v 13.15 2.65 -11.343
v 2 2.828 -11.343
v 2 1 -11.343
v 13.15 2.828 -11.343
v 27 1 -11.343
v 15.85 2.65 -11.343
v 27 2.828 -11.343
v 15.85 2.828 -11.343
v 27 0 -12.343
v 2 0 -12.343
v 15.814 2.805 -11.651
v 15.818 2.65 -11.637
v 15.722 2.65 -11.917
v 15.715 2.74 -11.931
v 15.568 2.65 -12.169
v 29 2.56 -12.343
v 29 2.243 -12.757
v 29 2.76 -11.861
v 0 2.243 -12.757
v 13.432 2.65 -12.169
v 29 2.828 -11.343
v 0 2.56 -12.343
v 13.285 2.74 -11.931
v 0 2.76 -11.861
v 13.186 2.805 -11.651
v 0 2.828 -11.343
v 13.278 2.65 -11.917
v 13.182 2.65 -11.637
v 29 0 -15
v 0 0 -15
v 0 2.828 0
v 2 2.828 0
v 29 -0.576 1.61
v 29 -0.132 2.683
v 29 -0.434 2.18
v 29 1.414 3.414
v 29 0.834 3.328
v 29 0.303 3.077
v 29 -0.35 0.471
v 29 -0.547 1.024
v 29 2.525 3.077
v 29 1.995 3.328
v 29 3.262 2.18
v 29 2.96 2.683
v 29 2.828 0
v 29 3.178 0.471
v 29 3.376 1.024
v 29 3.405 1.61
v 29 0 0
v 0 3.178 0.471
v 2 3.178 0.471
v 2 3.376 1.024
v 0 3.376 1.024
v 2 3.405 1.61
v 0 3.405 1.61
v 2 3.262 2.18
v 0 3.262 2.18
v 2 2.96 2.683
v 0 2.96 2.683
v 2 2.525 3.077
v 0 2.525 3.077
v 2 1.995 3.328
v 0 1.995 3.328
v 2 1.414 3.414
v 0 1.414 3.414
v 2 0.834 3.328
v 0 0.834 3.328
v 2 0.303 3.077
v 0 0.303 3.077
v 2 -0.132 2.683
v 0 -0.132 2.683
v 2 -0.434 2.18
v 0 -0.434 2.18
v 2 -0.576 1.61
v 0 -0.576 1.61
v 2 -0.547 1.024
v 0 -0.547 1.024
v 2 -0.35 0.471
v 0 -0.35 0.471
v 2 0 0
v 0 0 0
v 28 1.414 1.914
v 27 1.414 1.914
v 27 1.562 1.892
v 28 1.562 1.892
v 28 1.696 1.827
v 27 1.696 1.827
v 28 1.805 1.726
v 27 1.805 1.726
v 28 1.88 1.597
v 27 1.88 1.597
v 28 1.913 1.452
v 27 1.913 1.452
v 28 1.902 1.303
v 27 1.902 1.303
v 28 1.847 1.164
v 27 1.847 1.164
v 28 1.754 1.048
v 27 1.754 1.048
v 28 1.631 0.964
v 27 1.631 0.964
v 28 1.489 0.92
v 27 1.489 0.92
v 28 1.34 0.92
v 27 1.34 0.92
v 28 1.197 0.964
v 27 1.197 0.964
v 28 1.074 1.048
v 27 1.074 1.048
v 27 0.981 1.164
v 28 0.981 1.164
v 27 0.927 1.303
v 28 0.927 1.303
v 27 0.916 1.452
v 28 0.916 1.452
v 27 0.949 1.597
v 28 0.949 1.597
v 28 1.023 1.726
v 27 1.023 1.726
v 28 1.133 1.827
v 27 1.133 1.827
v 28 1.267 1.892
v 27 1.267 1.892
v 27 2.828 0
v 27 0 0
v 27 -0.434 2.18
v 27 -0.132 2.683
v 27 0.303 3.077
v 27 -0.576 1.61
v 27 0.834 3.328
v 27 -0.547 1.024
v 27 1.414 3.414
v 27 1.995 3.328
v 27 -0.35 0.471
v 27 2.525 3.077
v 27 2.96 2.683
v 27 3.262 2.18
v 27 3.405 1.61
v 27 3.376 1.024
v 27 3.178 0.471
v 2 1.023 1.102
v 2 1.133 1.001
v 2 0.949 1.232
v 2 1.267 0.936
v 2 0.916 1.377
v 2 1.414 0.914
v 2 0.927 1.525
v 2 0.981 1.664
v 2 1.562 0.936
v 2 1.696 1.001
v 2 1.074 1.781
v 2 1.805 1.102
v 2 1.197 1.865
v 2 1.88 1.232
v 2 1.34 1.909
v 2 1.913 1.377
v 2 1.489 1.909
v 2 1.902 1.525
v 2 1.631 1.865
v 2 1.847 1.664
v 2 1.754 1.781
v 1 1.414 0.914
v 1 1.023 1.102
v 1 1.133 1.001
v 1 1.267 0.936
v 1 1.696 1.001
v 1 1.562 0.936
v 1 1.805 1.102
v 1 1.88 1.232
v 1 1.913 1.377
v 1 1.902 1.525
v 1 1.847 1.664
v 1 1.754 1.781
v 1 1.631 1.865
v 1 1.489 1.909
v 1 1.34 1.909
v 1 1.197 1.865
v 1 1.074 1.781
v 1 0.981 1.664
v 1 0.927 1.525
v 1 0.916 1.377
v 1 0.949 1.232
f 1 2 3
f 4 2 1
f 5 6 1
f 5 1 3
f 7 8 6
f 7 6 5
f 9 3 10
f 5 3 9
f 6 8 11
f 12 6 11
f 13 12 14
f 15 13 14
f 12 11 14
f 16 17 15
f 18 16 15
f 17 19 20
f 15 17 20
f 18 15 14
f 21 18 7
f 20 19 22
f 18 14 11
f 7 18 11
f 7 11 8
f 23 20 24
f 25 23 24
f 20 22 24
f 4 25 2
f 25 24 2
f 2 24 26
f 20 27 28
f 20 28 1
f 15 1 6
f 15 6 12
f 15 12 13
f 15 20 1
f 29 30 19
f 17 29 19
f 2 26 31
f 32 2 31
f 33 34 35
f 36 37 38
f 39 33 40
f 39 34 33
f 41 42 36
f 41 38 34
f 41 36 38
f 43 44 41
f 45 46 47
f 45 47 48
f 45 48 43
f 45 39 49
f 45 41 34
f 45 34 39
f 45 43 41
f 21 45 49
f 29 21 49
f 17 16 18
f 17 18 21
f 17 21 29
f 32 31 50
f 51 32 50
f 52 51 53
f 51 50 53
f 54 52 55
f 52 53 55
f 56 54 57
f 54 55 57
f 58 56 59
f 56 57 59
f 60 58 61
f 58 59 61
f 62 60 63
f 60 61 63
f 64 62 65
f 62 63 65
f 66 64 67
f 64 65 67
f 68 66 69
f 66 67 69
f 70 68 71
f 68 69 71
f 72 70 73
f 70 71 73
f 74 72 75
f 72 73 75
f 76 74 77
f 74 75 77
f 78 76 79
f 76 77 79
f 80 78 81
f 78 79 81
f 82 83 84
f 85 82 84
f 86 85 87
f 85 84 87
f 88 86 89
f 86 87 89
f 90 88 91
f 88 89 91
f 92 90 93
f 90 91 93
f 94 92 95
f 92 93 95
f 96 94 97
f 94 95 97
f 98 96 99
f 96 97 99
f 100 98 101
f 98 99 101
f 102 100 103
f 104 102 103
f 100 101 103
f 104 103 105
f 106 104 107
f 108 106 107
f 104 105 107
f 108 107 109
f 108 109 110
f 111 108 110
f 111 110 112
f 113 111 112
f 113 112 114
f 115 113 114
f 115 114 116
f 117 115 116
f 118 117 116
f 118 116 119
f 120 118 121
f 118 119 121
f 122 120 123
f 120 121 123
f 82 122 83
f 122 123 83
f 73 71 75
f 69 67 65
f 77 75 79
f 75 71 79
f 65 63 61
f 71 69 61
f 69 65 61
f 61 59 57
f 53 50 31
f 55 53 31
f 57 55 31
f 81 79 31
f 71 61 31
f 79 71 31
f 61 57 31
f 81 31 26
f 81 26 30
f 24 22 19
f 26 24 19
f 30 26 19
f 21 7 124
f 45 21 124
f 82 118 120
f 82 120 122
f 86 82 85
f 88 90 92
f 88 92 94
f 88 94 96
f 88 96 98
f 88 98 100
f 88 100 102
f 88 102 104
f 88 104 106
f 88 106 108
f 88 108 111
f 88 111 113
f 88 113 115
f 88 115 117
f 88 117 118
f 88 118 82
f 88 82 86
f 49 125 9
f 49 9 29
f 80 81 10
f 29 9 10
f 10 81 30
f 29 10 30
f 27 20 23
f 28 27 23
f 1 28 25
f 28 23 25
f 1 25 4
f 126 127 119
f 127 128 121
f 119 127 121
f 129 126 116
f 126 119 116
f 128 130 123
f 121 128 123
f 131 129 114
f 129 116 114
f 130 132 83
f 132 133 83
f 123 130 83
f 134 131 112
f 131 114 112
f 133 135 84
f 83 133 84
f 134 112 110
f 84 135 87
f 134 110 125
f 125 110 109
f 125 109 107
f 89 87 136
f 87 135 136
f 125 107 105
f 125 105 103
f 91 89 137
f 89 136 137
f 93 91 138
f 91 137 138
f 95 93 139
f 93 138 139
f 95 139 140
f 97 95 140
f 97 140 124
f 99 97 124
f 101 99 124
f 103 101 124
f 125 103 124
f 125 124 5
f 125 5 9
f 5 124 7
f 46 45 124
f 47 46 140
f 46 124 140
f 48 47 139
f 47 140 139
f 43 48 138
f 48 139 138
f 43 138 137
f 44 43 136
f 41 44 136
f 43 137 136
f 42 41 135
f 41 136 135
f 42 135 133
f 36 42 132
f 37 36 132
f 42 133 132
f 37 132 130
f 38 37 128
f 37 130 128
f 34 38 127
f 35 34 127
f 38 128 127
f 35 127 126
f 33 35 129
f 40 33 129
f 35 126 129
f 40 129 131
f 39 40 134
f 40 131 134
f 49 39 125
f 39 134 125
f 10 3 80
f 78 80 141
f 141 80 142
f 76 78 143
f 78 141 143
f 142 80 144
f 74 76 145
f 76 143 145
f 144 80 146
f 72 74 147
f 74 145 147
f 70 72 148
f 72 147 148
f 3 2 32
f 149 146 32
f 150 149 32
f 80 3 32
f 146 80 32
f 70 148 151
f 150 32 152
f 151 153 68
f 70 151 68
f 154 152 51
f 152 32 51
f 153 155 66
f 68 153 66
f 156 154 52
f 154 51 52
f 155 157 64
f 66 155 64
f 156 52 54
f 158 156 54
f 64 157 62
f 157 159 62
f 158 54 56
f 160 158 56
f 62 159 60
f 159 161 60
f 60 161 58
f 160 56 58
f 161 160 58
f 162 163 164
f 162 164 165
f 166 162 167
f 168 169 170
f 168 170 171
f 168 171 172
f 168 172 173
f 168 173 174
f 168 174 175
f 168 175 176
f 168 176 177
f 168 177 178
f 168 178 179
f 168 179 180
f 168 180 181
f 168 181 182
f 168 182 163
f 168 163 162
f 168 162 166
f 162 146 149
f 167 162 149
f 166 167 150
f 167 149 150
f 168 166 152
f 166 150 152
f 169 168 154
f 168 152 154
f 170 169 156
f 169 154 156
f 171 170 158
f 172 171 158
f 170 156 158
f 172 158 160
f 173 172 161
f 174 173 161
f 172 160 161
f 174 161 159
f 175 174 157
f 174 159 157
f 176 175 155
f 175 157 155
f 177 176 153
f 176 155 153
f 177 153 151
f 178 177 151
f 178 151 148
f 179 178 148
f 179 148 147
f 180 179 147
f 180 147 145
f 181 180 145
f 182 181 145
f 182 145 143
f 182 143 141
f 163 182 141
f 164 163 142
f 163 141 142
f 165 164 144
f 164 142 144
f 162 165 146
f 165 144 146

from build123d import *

# Parameters (mm, degrees)
SALIENTE_EXTRUIR1_DEPTH = 29
CORTAR_EXTRUIR1_DEPTH   = 14.5
CHAFL_N1_SIZE           = 1
CROQUIS3_R              = 0.5
CORTAR_EXTRUIR2_DEPTH   = 1
CROQUIS4_R              = 0.5
CORTAR_EXTRUIR3_DEPTH   = 1
CORTAR_EXTRUIR5_DEPTH   = 0.2


with BuildPart() as part:
    # Croquis1 → Saliente-Extruir1 (new body)
    with BuildSketch(Plane(origin=(0, 0, 0), x_dir=(0, 0, -1), z_dir=(1, 0, 0))):
        with BuildLine():
            Line((0, 0), (15, 0))
            Line((15, 0), (12.757359313, 2.242640687))
            ThreePointArc((12.757359313, 2.242640687), (12.108512615, 2.67618619), (11.343145751, 2.828427125))
            Line((11.343145751, 2.828427125), (0, 2.828427125))
            ThreePointArc((0, 2.828427125), (-3.414213562, 1.414213562), (0, 0))
        make_face()
    extrude(amount=SALIENTE_EXTRUIR1_DEPTH)

    # Croquis2 → Cortar-Extruir1 (cut, symmetric)
    with BuildSketch(Plane(origin=(0, 2.828427125, 0), x_dir=(1, 0, 0), z_dir=(0, 1, 0))):
        Polygon((2, 0), (2, 11.343145751), (27, 11.343145751), (27, 0), (27, -11.34659481), (2, -9.45811087), align=None)
    extrude(amount=CORTAR_EXTRUIR1_DEPTH, both=True, mode=Mode.SUBTRACT)

    # Chaflán1
    chafl_n1_edges = [part.edges().sort_by_distance(p)[0] for p in [
        (14.5, 0, -11.343145751),
    ]]
    chamfer(chafl_n1_edges, length=CHAFL_N1_SIZE)

    # Croquis3 → Cortar-Extruir2 (cut)
    with BuildSketch(Plane.ZY.offset(-27)):
        with Locations((1.414213562, 1.414213562)):
            Circle(CROQUIS3_R)
    extrude(amount=-CORTAR_EXTRUIR2_DEPTH, mode=Mode.SUBTRACT)

    # Croquis4 → Cortar-Extruir3 (cut)
    with BuildSketch(Plane(origin=(2, 0, 0), x_dir=(0, 0, -1), z_dir=(1, 0, 0))):
        with Locations((-1.414213562, 1.414213562)):
            Circle(CROQUIS4_R)
    extrude(amount=-CORTAR_EXTRUIR3_DEPTH, mode=Mode.SUBTRACT)

    # Croquis5 → Cortar-Extruir5 (cut)
    with BuildSketch(Plane(origin=(0, 2.85, 0), x_dir=(1, 0, 0), z_dir=(0, 1, 0))):
        with BuildLine():
            Line((13.15, 11.343145751), (15.85, 11.343145751))
            ThreePointArc((15.85, 11.343145751), (14.5, 12.693145751), (13.15, 11.343145751))
        make_face()
    extrude(amount=-CORTAR_EXTRUIR5_DEPTH, mode=Mode.SUBTRACT)


solid = part.part
